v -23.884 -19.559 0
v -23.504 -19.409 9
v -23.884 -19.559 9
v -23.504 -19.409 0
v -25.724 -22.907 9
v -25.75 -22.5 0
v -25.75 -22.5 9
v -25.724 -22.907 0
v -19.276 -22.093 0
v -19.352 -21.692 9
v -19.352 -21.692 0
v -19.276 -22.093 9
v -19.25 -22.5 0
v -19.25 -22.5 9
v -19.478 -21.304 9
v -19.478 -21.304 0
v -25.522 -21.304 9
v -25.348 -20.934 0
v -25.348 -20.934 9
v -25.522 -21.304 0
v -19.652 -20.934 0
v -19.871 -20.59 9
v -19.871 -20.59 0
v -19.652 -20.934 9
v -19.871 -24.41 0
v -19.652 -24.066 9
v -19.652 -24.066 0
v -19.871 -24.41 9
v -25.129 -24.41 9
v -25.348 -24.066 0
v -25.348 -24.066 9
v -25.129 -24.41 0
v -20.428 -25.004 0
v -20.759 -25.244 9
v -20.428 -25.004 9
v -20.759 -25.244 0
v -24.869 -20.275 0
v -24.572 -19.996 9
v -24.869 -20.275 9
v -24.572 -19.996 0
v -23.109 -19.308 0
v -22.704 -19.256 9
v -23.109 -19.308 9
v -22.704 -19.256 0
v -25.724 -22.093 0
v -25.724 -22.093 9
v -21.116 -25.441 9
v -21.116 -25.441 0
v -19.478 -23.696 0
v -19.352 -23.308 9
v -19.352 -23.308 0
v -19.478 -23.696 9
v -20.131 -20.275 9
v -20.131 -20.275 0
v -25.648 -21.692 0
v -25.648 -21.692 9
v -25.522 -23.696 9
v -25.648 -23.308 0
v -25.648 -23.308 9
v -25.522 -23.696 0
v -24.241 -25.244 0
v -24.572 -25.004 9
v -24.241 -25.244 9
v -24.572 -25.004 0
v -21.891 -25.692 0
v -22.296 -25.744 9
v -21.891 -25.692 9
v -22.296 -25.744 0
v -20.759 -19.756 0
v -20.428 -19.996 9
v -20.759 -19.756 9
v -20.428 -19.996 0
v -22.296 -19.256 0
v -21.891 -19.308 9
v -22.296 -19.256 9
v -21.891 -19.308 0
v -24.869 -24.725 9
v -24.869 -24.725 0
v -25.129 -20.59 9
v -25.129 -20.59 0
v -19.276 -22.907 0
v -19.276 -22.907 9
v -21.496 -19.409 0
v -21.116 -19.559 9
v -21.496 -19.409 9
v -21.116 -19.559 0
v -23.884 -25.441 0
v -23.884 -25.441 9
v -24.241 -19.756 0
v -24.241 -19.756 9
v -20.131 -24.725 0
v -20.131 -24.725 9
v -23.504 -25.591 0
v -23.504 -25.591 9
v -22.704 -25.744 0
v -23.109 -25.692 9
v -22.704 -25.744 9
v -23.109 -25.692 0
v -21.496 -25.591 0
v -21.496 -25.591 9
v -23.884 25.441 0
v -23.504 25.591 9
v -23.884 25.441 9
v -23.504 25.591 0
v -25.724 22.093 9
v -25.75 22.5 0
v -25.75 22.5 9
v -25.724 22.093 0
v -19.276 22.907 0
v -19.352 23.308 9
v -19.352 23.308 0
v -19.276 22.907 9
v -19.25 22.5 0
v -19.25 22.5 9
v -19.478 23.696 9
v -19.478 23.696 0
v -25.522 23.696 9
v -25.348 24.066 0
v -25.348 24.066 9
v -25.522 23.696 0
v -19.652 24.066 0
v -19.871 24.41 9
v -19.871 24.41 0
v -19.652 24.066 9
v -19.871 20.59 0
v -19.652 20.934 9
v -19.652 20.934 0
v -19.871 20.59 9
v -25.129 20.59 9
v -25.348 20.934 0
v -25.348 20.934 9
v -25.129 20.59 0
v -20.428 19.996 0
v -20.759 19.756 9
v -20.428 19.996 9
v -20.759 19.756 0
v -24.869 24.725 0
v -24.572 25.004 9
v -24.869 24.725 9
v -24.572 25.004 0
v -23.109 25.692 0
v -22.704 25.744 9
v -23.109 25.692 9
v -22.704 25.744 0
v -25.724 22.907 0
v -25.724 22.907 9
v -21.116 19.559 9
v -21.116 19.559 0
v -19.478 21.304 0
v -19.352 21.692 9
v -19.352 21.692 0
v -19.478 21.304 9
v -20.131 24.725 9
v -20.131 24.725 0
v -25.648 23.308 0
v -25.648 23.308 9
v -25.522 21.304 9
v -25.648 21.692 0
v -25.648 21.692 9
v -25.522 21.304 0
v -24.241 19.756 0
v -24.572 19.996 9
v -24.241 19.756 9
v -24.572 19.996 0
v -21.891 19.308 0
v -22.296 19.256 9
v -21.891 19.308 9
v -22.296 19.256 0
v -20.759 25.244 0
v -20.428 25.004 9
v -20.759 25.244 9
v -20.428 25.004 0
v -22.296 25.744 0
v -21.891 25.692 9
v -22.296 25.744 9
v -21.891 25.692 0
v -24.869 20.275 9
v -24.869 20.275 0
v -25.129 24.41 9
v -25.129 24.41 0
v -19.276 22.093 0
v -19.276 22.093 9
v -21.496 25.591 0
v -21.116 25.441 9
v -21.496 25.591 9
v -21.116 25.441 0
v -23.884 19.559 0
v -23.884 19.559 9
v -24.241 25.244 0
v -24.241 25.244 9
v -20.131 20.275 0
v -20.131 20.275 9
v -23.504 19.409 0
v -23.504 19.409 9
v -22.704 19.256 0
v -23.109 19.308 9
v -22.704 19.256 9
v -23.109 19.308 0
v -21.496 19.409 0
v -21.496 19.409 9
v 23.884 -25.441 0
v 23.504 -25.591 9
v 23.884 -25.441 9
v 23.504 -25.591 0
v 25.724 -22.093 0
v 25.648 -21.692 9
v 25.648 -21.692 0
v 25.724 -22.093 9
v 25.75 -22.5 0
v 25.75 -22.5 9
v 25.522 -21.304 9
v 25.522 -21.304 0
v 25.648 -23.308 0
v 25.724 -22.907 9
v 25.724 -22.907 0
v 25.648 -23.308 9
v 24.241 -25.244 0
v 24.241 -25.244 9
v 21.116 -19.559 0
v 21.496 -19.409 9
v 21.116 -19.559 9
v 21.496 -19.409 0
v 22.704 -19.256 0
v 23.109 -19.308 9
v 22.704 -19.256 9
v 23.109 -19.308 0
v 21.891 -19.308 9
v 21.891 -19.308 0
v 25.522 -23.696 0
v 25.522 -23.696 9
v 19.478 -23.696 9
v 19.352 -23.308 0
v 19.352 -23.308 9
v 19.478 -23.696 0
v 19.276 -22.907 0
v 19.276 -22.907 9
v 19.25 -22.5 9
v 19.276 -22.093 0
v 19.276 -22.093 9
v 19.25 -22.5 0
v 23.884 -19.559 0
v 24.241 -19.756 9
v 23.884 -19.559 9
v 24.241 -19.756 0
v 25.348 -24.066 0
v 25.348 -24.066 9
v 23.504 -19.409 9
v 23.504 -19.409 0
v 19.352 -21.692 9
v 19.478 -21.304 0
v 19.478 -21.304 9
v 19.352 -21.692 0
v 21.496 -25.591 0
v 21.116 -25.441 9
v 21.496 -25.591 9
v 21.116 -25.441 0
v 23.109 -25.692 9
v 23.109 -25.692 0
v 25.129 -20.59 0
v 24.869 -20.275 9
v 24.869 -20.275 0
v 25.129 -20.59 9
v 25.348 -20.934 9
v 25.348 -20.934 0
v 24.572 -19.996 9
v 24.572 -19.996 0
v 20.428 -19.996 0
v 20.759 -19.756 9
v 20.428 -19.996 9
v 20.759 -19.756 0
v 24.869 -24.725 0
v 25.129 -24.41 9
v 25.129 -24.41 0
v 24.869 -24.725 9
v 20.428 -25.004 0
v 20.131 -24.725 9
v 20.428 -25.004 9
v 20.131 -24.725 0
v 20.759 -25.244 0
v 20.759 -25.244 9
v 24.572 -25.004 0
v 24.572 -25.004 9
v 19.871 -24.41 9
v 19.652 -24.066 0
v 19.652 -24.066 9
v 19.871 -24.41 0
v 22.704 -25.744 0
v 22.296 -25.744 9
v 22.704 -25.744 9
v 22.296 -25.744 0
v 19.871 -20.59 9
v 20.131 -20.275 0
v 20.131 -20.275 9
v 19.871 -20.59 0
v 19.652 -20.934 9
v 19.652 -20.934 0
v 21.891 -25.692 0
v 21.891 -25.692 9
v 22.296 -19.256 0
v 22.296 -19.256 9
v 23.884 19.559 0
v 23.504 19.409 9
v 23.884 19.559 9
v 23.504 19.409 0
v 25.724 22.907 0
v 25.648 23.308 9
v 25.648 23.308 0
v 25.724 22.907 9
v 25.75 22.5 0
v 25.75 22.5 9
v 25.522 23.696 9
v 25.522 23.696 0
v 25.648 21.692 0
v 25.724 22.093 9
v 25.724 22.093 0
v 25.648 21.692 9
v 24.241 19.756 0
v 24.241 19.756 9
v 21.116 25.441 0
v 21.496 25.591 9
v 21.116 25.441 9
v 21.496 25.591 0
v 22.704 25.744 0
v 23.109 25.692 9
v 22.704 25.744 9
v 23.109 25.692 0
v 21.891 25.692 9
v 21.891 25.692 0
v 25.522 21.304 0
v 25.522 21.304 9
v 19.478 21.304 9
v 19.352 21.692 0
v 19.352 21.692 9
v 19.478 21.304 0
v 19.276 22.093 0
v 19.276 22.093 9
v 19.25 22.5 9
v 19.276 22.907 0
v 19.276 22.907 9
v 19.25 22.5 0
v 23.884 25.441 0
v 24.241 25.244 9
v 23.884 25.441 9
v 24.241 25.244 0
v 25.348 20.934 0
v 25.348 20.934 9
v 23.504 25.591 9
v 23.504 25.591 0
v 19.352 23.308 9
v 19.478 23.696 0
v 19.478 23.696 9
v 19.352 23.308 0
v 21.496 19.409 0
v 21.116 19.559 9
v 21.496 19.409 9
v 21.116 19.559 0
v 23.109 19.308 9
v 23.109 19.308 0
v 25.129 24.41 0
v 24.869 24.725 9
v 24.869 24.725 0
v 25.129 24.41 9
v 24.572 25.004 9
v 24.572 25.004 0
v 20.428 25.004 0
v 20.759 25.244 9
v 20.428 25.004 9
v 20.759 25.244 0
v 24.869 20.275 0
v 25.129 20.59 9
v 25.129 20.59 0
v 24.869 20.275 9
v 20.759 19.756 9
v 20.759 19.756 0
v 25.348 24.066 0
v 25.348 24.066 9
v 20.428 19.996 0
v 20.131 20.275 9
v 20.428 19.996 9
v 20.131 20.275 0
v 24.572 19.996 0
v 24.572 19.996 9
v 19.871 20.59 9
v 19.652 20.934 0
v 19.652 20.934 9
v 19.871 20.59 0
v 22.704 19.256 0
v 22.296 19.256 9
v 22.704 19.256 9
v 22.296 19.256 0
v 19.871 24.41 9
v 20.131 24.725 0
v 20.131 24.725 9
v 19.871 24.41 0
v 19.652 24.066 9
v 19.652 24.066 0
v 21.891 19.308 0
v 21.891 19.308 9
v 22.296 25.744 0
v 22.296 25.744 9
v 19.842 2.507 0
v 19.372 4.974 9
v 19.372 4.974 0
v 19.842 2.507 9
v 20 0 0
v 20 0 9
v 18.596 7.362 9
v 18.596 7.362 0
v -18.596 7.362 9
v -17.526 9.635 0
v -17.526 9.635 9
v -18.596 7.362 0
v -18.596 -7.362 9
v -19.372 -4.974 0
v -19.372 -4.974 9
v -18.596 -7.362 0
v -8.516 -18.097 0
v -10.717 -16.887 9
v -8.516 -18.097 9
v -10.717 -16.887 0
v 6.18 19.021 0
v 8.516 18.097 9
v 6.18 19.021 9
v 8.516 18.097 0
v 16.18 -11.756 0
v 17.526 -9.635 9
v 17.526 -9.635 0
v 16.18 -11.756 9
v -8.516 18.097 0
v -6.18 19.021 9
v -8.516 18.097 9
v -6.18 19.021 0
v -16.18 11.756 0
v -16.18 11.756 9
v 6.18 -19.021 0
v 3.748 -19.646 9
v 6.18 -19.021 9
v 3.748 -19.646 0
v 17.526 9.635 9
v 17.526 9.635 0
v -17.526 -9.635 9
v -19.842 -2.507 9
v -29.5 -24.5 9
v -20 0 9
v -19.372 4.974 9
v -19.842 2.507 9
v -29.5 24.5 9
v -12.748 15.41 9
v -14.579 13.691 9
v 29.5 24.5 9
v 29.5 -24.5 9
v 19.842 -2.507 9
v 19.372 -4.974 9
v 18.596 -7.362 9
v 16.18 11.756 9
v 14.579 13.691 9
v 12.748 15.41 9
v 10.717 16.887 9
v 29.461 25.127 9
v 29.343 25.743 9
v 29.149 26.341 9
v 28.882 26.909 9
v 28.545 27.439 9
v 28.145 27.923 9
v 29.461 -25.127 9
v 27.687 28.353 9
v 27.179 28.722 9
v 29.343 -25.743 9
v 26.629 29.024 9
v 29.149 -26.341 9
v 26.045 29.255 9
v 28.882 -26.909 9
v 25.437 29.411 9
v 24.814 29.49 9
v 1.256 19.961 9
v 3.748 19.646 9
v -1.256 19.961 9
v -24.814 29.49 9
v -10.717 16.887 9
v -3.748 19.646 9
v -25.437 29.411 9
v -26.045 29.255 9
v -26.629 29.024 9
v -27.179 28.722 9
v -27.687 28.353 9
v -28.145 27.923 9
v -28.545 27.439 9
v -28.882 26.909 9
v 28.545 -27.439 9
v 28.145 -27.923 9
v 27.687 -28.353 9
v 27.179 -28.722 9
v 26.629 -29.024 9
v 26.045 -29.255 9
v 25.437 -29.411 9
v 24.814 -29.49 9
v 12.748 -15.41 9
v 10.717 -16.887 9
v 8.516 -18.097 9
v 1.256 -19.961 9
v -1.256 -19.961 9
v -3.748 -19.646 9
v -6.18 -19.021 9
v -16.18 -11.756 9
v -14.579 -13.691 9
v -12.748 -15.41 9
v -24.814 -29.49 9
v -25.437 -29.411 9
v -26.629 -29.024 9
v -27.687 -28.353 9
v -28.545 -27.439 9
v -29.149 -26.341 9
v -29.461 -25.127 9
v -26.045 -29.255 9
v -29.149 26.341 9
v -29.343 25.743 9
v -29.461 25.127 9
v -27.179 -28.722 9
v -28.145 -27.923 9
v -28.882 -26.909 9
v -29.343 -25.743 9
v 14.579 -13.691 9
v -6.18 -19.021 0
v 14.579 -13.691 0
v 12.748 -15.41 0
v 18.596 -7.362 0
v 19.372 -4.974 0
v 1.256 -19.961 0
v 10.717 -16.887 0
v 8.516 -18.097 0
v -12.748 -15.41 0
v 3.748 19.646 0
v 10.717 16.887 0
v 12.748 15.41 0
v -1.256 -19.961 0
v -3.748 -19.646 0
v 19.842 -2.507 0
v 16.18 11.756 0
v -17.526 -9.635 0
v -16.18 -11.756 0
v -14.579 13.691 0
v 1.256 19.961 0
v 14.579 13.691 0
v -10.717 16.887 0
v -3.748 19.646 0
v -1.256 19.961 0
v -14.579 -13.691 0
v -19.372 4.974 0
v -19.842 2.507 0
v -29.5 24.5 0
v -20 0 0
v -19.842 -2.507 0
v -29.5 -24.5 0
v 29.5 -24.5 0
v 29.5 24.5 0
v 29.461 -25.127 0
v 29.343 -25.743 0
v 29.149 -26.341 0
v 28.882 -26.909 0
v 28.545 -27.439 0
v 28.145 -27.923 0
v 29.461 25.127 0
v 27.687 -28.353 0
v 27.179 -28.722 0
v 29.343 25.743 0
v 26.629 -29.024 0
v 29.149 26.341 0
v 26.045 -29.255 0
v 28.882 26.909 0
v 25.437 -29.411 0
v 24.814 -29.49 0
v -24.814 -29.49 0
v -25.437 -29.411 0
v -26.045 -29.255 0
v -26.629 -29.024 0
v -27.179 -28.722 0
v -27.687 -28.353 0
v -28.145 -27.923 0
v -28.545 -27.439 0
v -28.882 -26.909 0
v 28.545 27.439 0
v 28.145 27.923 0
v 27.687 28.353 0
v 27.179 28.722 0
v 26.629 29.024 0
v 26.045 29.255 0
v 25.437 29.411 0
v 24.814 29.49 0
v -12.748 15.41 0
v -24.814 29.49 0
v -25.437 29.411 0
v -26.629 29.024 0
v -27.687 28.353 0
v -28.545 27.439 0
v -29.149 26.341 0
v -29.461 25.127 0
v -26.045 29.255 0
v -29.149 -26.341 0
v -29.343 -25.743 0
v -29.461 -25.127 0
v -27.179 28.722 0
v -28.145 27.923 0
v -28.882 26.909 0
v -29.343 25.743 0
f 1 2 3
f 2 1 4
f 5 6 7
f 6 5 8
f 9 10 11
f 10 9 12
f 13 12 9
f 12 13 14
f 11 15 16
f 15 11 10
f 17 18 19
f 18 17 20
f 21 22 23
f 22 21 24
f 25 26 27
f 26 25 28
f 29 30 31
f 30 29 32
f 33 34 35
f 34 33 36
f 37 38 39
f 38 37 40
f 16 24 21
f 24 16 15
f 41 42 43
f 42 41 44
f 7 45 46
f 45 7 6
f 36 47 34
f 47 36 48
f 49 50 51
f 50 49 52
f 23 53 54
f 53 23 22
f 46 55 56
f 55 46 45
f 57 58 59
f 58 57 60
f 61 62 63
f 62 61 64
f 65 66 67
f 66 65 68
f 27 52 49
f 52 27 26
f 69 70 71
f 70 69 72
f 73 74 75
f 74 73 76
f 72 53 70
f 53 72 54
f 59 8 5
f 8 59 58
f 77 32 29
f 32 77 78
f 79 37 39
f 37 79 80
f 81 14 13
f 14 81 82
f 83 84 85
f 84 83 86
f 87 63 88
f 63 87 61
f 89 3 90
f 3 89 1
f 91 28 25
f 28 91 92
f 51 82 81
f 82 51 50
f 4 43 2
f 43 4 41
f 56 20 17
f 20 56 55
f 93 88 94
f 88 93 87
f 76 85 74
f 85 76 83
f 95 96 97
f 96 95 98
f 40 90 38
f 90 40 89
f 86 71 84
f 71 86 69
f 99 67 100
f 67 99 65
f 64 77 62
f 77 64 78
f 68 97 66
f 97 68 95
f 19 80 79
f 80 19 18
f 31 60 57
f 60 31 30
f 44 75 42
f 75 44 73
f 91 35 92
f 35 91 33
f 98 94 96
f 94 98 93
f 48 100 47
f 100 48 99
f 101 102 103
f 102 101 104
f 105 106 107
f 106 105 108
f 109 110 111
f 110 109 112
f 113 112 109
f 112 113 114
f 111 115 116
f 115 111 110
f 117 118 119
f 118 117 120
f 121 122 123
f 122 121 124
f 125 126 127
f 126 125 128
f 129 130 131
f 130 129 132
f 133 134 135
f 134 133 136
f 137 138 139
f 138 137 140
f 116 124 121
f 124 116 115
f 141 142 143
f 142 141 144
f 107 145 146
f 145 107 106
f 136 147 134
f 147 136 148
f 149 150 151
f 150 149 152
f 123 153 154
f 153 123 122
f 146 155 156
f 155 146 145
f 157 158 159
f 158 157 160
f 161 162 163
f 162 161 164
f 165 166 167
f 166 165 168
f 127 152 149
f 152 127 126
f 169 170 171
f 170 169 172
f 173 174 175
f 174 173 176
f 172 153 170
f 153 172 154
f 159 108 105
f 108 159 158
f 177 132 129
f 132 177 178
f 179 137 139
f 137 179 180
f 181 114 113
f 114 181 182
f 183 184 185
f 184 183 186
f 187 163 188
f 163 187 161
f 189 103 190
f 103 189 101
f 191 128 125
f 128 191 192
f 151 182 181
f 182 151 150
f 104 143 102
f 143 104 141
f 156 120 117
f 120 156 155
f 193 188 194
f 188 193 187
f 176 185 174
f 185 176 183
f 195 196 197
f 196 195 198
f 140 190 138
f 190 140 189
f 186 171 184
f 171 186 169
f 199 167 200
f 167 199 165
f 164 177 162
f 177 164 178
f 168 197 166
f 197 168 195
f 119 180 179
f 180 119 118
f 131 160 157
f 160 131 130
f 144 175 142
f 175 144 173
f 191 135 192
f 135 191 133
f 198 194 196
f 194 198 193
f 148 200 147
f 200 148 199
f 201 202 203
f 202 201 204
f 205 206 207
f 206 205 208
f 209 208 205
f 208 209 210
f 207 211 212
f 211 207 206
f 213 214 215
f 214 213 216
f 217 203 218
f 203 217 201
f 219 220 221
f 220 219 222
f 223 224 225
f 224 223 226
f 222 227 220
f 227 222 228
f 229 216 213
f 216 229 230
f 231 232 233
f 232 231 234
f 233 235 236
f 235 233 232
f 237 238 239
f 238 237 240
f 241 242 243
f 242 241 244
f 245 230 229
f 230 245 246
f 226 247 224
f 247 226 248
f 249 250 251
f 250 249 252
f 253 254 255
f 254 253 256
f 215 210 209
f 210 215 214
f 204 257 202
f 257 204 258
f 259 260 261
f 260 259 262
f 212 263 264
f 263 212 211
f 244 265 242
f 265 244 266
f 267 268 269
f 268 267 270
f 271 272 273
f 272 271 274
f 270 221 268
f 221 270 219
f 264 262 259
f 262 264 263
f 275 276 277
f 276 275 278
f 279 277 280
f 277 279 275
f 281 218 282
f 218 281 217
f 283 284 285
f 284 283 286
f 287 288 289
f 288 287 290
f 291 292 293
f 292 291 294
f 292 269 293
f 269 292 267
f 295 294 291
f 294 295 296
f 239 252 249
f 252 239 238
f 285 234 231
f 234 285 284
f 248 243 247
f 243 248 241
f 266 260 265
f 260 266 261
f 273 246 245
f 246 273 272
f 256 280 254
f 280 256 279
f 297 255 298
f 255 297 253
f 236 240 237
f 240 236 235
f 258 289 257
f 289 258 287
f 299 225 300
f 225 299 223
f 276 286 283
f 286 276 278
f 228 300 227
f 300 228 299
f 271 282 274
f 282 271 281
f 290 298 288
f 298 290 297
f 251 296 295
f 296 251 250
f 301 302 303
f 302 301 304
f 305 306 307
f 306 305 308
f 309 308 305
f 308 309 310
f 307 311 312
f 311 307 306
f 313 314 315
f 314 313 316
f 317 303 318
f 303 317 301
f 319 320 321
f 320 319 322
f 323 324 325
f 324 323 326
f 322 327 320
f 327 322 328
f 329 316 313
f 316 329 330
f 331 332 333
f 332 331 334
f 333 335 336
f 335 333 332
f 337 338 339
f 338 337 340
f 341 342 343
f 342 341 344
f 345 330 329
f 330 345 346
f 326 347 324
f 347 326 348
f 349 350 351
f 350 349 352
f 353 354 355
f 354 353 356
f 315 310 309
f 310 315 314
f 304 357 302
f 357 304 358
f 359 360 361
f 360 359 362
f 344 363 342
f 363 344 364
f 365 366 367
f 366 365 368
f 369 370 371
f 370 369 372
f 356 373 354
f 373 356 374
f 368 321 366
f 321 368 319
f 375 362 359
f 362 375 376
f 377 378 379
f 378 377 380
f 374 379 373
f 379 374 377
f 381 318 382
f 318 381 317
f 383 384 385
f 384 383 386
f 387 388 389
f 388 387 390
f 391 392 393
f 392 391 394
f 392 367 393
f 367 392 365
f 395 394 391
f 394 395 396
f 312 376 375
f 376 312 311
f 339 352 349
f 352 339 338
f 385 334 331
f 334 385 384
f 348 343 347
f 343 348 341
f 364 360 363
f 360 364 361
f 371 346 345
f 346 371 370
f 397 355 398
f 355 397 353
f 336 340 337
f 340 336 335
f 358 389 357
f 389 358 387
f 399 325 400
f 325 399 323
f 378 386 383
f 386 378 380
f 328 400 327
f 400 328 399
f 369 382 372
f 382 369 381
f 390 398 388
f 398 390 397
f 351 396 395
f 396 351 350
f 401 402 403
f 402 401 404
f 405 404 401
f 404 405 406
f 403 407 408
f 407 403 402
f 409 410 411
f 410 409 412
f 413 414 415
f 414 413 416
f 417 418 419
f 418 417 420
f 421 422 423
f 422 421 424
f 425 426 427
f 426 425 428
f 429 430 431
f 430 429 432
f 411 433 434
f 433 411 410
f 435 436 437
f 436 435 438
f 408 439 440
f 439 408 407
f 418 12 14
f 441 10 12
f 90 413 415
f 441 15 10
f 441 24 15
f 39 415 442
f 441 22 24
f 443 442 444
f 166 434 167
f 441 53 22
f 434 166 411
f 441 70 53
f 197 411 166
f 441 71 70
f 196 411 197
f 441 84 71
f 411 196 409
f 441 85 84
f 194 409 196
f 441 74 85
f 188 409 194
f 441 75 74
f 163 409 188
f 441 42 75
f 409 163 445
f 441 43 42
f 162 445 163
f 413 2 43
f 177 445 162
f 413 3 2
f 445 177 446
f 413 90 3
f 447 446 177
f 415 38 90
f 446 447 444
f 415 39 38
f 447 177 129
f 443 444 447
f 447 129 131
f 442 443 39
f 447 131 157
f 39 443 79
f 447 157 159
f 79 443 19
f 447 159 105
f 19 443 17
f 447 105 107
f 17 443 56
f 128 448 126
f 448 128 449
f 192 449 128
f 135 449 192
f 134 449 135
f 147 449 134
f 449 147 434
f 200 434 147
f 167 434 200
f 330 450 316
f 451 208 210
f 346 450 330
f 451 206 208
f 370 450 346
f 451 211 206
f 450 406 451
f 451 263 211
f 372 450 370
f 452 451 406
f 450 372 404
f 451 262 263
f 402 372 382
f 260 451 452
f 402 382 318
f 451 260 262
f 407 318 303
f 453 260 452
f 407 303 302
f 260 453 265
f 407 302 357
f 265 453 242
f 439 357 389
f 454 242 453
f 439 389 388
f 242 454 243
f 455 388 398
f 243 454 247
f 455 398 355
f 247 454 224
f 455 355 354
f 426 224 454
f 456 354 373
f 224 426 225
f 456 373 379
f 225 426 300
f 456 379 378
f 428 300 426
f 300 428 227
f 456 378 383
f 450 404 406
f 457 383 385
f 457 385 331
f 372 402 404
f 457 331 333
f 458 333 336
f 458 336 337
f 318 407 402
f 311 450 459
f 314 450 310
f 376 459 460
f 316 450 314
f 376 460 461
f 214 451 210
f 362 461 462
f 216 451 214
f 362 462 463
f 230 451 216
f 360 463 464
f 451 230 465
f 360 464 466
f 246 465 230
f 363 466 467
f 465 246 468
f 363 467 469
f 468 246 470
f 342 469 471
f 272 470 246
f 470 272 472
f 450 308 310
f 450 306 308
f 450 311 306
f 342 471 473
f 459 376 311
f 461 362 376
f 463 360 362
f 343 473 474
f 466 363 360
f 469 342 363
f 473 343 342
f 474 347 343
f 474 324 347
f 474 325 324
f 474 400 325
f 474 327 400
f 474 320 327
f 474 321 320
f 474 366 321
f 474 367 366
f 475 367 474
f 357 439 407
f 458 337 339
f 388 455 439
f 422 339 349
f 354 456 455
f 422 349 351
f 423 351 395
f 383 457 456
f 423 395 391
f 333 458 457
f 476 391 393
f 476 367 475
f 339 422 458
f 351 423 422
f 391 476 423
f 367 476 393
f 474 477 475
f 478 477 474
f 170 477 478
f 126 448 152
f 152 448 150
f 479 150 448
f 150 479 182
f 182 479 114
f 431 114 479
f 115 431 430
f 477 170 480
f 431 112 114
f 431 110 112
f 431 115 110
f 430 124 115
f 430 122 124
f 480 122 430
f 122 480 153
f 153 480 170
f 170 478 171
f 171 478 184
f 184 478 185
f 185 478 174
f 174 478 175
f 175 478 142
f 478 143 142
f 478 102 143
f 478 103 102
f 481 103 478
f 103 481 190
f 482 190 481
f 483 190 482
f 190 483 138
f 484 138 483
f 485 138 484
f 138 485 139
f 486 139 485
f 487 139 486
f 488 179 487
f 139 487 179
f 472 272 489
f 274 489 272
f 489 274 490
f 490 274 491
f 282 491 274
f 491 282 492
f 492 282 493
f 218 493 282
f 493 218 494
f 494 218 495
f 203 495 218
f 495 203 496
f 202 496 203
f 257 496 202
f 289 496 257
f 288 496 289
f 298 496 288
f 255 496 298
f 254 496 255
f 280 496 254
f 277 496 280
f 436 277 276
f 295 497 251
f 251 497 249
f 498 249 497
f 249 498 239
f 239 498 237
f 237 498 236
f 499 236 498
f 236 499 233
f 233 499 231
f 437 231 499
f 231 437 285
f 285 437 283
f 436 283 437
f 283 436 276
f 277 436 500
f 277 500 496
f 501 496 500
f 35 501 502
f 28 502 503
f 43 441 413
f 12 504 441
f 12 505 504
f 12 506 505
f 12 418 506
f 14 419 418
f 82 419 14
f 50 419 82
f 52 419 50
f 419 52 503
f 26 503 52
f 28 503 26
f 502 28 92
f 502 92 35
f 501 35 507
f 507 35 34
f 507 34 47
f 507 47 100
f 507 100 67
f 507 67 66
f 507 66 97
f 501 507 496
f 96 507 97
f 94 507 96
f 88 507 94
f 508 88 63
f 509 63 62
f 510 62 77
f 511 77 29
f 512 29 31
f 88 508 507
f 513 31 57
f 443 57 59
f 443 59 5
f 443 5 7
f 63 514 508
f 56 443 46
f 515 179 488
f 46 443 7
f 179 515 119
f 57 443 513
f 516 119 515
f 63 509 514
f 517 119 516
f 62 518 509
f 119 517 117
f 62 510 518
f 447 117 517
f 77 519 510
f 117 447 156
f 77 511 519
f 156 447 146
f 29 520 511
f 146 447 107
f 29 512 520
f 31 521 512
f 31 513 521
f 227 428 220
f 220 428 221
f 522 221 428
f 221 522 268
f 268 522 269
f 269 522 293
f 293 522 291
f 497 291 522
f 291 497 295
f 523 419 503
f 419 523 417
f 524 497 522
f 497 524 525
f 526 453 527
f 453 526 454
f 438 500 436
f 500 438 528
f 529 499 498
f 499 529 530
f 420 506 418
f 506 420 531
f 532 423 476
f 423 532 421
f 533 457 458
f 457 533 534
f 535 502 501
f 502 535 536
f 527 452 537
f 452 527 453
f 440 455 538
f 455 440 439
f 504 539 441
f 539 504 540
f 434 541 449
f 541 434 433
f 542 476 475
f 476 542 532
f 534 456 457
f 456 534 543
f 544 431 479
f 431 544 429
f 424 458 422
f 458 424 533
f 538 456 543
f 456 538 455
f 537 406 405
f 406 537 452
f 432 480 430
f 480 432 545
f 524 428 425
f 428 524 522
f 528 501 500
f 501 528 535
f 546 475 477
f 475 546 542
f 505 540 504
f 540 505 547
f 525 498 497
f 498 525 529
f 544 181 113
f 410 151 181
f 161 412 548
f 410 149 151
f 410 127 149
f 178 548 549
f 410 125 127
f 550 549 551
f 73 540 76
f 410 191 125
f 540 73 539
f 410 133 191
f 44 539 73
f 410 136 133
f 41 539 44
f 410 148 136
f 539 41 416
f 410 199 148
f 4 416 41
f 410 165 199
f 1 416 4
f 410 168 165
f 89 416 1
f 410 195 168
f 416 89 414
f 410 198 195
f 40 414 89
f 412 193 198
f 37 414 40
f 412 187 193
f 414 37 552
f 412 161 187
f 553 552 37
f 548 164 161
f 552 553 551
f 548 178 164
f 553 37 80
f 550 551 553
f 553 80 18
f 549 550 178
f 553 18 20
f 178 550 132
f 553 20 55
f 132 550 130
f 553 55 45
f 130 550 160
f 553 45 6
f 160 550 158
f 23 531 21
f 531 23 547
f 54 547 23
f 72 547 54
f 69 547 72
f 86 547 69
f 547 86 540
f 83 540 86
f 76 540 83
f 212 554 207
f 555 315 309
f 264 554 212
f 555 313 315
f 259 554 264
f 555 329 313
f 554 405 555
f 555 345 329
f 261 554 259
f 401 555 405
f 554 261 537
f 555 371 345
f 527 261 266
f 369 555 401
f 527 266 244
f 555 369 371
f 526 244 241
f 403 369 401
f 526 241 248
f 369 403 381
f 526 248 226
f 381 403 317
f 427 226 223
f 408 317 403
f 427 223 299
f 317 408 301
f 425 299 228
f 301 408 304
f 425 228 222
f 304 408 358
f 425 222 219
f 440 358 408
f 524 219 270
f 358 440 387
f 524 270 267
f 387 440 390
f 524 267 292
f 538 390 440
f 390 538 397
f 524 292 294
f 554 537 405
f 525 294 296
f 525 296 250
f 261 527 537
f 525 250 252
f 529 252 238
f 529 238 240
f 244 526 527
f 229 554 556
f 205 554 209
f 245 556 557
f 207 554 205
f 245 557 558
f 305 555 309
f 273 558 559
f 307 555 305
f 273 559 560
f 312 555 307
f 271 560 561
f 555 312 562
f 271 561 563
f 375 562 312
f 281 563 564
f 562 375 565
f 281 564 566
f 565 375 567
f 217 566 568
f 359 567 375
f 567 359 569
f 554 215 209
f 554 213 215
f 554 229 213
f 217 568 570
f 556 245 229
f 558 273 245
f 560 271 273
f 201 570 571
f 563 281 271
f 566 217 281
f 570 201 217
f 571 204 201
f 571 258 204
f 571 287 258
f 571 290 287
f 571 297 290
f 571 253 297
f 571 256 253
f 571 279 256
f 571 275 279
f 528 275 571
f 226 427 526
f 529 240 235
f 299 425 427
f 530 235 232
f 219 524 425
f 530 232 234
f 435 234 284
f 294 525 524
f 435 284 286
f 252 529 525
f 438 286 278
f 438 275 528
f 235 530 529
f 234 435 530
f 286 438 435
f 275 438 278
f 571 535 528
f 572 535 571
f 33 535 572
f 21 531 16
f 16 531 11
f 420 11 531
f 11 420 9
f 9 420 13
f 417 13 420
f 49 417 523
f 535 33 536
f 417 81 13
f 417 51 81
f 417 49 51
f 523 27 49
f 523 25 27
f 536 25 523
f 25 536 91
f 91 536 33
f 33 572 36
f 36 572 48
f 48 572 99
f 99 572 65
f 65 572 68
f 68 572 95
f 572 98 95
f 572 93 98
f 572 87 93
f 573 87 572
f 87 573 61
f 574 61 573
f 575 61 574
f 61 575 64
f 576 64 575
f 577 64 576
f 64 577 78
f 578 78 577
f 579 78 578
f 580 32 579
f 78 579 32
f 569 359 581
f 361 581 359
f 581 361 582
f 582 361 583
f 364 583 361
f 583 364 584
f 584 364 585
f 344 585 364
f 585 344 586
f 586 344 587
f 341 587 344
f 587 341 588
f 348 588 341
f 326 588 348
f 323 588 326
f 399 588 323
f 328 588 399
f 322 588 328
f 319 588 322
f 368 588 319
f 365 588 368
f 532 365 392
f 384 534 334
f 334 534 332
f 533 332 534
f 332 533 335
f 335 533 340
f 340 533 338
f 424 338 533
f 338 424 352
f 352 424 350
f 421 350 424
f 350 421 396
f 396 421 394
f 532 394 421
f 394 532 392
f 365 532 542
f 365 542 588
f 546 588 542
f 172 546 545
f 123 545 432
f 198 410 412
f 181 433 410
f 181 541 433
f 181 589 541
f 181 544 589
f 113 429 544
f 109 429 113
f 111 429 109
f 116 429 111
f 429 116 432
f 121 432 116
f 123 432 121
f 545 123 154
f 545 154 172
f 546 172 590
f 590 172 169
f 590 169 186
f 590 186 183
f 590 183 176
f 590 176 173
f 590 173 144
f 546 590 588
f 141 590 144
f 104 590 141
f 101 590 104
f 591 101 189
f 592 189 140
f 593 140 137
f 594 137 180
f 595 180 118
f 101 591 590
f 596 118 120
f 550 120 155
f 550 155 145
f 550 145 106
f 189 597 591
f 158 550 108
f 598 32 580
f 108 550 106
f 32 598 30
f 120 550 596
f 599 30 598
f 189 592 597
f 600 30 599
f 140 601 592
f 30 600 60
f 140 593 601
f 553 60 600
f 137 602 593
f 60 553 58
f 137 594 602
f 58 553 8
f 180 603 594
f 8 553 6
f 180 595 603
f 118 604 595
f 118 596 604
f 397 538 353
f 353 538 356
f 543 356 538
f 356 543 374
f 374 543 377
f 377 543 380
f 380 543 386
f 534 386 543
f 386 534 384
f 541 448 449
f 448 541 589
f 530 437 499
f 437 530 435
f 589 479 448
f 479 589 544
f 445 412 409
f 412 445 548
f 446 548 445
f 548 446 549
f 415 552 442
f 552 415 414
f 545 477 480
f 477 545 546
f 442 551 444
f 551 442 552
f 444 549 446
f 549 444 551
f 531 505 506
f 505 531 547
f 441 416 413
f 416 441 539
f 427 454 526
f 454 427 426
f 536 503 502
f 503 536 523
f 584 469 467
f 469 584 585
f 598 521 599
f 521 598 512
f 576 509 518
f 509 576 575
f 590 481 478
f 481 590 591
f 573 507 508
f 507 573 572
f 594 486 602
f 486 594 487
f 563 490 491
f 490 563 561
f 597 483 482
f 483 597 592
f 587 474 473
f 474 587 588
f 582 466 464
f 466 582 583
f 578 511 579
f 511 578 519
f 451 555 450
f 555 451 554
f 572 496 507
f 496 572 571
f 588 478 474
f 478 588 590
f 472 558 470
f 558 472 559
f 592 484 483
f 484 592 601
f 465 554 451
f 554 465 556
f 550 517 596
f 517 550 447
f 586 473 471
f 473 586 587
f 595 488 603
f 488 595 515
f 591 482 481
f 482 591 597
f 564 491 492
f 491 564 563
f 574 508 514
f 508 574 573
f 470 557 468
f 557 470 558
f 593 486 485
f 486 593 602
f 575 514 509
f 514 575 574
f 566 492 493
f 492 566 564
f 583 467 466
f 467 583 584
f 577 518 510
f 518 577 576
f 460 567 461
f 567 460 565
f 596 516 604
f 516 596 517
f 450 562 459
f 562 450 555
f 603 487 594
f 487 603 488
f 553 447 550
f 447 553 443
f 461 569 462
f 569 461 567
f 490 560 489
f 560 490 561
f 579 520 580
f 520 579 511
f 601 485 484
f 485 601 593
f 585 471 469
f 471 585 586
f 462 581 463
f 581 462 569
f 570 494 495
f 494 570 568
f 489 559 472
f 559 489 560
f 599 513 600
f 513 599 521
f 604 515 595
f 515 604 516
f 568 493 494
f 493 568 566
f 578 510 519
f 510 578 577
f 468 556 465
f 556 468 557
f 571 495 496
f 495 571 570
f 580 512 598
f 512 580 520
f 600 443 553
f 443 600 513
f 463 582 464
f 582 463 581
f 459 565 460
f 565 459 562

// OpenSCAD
$fn = 50;

difference() {
	union() {
		hull() {
			translate(v = [-24.5, 24.5, 0]) {
				cylinder(h = 9, r = 5);
			}
			translate(v = [24.5, 24.5, 0]) {
				cylinder(h = 9, r = 5);
			}
			translate(v = [-24.5, -24.5, 0]) {
				cylinder(h = 9, r = 5);
			}
			translate(v = [24.5, -24.5, 0]) {
				cylinder(h = 9, r = 5);
			}
		}
	}
	union() {
		translate(v = [-22.5, -22.5, -100.0]) {
			cylinder(h = 200, r = 3.25);
		}
		translate(v = [-22.5, 22.5, -100.0]) {
			cylinder(h = 200, r = 3.25);
		}
		translate(v = [22.5, -22.5, -100.0]) {
			cylinder(h = 200, r = 3.25);
		}
		translate(v = [22.5, 22.5, -100.0]) {
			cylinder(h = 200, r = 3.25);
		}
		translate(v = [-22.5, -22.5, -100.0]) {
			cylinder(h = 200, r = 1.8);
		}
		translate(v = [-22.5, 22.5, -100.0]) {
			cylinder(h = 200, r = 1.8);
		}
		translate(v = [22.5, -22.5, -100.0]) {
			cylinder(h = 200, r = 1.8);
		}
		translate(v = [22.5, 22.5, -100.0]) {
			cylinder(h = 200, r = 1.8);
		}
		cylinder(h = 9, r = 20.0);
	}
}
